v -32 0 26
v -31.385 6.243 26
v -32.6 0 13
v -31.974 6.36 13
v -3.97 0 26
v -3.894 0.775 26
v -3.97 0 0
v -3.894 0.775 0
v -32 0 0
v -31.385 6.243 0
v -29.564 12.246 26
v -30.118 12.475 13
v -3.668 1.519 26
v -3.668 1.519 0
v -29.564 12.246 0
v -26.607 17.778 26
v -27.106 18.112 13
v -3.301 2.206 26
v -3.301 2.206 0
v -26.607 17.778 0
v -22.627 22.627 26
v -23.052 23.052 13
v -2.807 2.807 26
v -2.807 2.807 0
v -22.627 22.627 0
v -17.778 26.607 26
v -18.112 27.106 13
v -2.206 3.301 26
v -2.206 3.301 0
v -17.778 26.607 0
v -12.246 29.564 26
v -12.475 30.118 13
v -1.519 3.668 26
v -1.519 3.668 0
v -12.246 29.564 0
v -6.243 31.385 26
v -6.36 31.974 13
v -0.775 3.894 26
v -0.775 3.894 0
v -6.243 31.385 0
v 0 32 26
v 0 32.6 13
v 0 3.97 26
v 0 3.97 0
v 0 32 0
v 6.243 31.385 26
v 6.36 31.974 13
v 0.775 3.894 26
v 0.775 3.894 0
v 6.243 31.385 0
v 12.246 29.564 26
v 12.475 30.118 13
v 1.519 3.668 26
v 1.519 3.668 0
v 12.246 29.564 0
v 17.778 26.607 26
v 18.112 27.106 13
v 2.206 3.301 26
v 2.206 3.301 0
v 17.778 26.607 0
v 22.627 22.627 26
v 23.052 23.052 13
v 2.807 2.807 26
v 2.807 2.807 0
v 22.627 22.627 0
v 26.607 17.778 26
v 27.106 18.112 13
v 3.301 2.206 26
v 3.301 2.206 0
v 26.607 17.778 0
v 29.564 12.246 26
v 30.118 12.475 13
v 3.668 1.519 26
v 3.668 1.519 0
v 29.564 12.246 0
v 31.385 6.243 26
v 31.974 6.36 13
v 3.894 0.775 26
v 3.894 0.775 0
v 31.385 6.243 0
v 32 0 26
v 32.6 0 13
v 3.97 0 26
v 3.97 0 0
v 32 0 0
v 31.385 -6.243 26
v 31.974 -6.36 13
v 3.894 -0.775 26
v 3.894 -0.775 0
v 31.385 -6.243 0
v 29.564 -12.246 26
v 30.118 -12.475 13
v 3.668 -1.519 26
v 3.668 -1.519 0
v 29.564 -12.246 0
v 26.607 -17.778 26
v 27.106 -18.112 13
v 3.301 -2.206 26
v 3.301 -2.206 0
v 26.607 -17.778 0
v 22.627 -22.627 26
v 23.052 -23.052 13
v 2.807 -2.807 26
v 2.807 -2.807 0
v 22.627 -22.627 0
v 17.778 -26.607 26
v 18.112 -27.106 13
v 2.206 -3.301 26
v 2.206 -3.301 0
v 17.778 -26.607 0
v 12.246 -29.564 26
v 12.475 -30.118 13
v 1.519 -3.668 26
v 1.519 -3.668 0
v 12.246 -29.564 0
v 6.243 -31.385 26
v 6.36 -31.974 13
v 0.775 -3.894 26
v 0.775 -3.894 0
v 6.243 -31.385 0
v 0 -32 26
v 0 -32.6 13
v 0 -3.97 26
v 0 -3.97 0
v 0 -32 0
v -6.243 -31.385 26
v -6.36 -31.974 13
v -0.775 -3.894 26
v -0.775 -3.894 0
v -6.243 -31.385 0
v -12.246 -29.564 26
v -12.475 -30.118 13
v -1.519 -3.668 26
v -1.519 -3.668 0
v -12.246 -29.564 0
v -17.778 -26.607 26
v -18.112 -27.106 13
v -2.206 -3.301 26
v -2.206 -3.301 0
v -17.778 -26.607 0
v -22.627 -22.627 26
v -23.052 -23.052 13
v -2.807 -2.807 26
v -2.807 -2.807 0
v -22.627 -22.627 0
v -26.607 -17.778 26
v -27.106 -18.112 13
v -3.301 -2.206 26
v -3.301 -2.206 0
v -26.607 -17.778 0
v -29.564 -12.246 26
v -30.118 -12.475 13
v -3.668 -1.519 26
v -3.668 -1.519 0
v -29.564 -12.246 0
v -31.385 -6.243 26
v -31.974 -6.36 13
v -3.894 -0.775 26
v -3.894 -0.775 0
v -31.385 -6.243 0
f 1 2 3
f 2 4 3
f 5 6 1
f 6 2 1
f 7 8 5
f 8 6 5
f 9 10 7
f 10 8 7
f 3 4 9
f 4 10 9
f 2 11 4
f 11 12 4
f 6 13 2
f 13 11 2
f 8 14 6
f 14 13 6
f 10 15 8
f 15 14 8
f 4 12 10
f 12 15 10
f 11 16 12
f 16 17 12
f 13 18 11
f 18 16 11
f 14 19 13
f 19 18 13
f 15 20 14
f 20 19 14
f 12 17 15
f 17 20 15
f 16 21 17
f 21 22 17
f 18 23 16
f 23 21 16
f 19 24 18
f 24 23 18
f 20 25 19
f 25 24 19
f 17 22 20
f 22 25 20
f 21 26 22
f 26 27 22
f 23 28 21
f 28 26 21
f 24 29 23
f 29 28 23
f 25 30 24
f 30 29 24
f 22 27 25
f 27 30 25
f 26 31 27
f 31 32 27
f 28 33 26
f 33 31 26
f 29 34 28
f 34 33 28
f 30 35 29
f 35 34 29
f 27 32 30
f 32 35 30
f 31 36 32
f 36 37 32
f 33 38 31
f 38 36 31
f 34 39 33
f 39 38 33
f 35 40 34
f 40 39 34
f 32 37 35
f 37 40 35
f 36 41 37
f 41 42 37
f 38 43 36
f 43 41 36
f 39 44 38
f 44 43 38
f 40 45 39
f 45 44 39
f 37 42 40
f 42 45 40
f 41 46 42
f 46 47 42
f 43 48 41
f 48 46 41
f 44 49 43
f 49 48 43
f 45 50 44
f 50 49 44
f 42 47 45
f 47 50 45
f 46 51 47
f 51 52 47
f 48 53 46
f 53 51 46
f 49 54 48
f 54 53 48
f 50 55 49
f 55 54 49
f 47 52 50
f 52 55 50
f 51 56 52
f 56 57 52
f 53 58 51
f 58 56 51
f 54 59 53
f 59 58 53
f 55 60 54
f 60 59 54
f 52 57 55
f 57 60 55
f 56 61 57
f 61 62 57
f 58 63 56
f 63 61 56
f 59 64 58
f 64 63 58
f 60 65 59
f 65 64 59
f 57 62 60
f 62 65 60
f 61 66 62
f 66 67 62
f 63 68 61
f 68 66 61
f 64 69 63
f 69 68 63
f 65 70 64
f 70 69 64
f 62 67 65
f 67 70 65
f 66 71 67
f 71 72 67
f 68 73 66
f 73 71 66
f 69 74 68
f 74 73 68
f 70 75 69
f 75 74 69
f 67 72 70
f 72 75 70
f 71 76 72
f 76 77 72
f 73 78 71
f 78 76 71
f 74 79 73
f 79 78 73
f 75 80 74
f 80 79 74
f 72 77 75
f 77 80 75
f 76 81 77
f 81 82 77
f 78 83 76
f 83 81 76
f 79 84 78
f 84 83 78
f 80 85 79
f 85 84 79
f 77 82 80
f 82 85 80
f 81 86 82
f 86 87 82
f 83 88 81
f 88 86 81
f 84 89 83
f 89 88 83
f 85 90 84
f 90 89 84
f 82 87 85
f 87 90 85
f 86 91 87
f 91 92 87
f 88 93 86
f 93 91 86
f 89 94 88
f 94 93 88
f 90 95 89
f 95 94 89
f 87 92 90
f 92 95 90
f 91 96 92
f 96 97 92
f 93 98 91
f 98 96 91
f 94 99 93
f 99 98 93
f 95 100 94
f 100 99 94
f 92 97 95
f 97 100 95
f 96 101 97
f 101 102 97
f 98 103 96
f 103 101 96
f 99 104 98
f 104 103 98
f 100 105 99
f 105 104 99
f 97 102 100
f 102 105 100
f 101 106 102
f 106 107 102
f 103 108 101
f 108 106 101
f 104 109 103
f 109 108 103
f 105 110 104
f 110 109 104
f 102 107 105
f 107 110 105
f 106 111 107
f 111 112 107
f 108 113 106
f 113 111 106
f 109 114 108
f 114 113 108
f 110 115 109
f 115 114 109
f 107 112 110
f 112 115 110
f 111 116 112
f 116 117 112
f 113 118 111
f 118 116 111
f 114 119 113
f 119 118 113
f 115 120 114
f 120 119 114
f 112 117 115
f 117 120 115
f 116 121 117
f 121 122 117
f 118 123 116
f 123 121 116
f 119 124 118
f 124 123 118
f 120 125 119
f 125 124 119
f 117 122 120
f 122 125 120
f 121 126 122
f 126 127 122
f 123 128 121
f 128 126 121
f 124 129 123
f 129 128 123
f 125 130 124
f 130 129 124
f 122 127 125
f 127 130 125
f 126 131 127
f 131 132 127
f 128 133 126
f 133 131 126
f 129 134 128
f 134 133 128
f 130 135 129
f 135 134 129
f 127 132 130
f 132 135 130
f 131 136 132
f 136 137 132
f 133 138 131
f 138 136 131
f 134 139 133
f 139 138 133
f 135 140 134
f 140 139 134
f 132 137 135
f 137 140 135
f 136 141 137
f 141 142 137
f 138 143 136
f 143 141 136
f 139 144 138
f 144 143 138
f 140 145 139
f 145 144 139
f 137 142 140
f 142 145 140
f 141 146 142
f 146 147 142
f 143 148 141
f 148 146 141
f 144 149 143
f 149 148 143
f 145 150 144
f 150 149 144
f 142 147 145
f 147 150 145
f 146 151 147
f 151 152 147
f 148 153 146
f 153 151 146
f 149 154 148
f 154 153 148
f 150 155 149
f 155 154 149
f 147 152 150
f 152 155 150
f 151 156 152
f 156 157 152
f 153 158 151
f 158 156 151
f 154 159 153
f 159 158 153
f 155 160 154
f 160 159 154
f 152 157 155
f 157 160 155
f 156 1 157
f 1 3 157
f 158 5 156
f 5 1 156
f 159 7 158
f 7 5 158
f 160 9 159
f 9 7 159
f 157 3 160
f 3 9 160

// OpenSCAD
$fn = 32;

// ----------------------------------------------------------------------
// Belt roller: 64 mm barrel, 26 mm wide, bore 7.94 mm
// ----------------------------------------------------------------------

// --- parameters (mm) ---
bore_d = 7.94;            // bore
barrel_d = 64;            // barrel diameter
roller_w = 26;            // roller width
crown = 0.6;              // crown height at mid width

roller_profile = [[3.97, 0], [32, 0], [32.6, 13], [32, 26], [3.97, 26]];

/* the profile stays clear of the axis, so the bore comes out of the revolve */
rotate_extrude() polygon(roller_profile);
